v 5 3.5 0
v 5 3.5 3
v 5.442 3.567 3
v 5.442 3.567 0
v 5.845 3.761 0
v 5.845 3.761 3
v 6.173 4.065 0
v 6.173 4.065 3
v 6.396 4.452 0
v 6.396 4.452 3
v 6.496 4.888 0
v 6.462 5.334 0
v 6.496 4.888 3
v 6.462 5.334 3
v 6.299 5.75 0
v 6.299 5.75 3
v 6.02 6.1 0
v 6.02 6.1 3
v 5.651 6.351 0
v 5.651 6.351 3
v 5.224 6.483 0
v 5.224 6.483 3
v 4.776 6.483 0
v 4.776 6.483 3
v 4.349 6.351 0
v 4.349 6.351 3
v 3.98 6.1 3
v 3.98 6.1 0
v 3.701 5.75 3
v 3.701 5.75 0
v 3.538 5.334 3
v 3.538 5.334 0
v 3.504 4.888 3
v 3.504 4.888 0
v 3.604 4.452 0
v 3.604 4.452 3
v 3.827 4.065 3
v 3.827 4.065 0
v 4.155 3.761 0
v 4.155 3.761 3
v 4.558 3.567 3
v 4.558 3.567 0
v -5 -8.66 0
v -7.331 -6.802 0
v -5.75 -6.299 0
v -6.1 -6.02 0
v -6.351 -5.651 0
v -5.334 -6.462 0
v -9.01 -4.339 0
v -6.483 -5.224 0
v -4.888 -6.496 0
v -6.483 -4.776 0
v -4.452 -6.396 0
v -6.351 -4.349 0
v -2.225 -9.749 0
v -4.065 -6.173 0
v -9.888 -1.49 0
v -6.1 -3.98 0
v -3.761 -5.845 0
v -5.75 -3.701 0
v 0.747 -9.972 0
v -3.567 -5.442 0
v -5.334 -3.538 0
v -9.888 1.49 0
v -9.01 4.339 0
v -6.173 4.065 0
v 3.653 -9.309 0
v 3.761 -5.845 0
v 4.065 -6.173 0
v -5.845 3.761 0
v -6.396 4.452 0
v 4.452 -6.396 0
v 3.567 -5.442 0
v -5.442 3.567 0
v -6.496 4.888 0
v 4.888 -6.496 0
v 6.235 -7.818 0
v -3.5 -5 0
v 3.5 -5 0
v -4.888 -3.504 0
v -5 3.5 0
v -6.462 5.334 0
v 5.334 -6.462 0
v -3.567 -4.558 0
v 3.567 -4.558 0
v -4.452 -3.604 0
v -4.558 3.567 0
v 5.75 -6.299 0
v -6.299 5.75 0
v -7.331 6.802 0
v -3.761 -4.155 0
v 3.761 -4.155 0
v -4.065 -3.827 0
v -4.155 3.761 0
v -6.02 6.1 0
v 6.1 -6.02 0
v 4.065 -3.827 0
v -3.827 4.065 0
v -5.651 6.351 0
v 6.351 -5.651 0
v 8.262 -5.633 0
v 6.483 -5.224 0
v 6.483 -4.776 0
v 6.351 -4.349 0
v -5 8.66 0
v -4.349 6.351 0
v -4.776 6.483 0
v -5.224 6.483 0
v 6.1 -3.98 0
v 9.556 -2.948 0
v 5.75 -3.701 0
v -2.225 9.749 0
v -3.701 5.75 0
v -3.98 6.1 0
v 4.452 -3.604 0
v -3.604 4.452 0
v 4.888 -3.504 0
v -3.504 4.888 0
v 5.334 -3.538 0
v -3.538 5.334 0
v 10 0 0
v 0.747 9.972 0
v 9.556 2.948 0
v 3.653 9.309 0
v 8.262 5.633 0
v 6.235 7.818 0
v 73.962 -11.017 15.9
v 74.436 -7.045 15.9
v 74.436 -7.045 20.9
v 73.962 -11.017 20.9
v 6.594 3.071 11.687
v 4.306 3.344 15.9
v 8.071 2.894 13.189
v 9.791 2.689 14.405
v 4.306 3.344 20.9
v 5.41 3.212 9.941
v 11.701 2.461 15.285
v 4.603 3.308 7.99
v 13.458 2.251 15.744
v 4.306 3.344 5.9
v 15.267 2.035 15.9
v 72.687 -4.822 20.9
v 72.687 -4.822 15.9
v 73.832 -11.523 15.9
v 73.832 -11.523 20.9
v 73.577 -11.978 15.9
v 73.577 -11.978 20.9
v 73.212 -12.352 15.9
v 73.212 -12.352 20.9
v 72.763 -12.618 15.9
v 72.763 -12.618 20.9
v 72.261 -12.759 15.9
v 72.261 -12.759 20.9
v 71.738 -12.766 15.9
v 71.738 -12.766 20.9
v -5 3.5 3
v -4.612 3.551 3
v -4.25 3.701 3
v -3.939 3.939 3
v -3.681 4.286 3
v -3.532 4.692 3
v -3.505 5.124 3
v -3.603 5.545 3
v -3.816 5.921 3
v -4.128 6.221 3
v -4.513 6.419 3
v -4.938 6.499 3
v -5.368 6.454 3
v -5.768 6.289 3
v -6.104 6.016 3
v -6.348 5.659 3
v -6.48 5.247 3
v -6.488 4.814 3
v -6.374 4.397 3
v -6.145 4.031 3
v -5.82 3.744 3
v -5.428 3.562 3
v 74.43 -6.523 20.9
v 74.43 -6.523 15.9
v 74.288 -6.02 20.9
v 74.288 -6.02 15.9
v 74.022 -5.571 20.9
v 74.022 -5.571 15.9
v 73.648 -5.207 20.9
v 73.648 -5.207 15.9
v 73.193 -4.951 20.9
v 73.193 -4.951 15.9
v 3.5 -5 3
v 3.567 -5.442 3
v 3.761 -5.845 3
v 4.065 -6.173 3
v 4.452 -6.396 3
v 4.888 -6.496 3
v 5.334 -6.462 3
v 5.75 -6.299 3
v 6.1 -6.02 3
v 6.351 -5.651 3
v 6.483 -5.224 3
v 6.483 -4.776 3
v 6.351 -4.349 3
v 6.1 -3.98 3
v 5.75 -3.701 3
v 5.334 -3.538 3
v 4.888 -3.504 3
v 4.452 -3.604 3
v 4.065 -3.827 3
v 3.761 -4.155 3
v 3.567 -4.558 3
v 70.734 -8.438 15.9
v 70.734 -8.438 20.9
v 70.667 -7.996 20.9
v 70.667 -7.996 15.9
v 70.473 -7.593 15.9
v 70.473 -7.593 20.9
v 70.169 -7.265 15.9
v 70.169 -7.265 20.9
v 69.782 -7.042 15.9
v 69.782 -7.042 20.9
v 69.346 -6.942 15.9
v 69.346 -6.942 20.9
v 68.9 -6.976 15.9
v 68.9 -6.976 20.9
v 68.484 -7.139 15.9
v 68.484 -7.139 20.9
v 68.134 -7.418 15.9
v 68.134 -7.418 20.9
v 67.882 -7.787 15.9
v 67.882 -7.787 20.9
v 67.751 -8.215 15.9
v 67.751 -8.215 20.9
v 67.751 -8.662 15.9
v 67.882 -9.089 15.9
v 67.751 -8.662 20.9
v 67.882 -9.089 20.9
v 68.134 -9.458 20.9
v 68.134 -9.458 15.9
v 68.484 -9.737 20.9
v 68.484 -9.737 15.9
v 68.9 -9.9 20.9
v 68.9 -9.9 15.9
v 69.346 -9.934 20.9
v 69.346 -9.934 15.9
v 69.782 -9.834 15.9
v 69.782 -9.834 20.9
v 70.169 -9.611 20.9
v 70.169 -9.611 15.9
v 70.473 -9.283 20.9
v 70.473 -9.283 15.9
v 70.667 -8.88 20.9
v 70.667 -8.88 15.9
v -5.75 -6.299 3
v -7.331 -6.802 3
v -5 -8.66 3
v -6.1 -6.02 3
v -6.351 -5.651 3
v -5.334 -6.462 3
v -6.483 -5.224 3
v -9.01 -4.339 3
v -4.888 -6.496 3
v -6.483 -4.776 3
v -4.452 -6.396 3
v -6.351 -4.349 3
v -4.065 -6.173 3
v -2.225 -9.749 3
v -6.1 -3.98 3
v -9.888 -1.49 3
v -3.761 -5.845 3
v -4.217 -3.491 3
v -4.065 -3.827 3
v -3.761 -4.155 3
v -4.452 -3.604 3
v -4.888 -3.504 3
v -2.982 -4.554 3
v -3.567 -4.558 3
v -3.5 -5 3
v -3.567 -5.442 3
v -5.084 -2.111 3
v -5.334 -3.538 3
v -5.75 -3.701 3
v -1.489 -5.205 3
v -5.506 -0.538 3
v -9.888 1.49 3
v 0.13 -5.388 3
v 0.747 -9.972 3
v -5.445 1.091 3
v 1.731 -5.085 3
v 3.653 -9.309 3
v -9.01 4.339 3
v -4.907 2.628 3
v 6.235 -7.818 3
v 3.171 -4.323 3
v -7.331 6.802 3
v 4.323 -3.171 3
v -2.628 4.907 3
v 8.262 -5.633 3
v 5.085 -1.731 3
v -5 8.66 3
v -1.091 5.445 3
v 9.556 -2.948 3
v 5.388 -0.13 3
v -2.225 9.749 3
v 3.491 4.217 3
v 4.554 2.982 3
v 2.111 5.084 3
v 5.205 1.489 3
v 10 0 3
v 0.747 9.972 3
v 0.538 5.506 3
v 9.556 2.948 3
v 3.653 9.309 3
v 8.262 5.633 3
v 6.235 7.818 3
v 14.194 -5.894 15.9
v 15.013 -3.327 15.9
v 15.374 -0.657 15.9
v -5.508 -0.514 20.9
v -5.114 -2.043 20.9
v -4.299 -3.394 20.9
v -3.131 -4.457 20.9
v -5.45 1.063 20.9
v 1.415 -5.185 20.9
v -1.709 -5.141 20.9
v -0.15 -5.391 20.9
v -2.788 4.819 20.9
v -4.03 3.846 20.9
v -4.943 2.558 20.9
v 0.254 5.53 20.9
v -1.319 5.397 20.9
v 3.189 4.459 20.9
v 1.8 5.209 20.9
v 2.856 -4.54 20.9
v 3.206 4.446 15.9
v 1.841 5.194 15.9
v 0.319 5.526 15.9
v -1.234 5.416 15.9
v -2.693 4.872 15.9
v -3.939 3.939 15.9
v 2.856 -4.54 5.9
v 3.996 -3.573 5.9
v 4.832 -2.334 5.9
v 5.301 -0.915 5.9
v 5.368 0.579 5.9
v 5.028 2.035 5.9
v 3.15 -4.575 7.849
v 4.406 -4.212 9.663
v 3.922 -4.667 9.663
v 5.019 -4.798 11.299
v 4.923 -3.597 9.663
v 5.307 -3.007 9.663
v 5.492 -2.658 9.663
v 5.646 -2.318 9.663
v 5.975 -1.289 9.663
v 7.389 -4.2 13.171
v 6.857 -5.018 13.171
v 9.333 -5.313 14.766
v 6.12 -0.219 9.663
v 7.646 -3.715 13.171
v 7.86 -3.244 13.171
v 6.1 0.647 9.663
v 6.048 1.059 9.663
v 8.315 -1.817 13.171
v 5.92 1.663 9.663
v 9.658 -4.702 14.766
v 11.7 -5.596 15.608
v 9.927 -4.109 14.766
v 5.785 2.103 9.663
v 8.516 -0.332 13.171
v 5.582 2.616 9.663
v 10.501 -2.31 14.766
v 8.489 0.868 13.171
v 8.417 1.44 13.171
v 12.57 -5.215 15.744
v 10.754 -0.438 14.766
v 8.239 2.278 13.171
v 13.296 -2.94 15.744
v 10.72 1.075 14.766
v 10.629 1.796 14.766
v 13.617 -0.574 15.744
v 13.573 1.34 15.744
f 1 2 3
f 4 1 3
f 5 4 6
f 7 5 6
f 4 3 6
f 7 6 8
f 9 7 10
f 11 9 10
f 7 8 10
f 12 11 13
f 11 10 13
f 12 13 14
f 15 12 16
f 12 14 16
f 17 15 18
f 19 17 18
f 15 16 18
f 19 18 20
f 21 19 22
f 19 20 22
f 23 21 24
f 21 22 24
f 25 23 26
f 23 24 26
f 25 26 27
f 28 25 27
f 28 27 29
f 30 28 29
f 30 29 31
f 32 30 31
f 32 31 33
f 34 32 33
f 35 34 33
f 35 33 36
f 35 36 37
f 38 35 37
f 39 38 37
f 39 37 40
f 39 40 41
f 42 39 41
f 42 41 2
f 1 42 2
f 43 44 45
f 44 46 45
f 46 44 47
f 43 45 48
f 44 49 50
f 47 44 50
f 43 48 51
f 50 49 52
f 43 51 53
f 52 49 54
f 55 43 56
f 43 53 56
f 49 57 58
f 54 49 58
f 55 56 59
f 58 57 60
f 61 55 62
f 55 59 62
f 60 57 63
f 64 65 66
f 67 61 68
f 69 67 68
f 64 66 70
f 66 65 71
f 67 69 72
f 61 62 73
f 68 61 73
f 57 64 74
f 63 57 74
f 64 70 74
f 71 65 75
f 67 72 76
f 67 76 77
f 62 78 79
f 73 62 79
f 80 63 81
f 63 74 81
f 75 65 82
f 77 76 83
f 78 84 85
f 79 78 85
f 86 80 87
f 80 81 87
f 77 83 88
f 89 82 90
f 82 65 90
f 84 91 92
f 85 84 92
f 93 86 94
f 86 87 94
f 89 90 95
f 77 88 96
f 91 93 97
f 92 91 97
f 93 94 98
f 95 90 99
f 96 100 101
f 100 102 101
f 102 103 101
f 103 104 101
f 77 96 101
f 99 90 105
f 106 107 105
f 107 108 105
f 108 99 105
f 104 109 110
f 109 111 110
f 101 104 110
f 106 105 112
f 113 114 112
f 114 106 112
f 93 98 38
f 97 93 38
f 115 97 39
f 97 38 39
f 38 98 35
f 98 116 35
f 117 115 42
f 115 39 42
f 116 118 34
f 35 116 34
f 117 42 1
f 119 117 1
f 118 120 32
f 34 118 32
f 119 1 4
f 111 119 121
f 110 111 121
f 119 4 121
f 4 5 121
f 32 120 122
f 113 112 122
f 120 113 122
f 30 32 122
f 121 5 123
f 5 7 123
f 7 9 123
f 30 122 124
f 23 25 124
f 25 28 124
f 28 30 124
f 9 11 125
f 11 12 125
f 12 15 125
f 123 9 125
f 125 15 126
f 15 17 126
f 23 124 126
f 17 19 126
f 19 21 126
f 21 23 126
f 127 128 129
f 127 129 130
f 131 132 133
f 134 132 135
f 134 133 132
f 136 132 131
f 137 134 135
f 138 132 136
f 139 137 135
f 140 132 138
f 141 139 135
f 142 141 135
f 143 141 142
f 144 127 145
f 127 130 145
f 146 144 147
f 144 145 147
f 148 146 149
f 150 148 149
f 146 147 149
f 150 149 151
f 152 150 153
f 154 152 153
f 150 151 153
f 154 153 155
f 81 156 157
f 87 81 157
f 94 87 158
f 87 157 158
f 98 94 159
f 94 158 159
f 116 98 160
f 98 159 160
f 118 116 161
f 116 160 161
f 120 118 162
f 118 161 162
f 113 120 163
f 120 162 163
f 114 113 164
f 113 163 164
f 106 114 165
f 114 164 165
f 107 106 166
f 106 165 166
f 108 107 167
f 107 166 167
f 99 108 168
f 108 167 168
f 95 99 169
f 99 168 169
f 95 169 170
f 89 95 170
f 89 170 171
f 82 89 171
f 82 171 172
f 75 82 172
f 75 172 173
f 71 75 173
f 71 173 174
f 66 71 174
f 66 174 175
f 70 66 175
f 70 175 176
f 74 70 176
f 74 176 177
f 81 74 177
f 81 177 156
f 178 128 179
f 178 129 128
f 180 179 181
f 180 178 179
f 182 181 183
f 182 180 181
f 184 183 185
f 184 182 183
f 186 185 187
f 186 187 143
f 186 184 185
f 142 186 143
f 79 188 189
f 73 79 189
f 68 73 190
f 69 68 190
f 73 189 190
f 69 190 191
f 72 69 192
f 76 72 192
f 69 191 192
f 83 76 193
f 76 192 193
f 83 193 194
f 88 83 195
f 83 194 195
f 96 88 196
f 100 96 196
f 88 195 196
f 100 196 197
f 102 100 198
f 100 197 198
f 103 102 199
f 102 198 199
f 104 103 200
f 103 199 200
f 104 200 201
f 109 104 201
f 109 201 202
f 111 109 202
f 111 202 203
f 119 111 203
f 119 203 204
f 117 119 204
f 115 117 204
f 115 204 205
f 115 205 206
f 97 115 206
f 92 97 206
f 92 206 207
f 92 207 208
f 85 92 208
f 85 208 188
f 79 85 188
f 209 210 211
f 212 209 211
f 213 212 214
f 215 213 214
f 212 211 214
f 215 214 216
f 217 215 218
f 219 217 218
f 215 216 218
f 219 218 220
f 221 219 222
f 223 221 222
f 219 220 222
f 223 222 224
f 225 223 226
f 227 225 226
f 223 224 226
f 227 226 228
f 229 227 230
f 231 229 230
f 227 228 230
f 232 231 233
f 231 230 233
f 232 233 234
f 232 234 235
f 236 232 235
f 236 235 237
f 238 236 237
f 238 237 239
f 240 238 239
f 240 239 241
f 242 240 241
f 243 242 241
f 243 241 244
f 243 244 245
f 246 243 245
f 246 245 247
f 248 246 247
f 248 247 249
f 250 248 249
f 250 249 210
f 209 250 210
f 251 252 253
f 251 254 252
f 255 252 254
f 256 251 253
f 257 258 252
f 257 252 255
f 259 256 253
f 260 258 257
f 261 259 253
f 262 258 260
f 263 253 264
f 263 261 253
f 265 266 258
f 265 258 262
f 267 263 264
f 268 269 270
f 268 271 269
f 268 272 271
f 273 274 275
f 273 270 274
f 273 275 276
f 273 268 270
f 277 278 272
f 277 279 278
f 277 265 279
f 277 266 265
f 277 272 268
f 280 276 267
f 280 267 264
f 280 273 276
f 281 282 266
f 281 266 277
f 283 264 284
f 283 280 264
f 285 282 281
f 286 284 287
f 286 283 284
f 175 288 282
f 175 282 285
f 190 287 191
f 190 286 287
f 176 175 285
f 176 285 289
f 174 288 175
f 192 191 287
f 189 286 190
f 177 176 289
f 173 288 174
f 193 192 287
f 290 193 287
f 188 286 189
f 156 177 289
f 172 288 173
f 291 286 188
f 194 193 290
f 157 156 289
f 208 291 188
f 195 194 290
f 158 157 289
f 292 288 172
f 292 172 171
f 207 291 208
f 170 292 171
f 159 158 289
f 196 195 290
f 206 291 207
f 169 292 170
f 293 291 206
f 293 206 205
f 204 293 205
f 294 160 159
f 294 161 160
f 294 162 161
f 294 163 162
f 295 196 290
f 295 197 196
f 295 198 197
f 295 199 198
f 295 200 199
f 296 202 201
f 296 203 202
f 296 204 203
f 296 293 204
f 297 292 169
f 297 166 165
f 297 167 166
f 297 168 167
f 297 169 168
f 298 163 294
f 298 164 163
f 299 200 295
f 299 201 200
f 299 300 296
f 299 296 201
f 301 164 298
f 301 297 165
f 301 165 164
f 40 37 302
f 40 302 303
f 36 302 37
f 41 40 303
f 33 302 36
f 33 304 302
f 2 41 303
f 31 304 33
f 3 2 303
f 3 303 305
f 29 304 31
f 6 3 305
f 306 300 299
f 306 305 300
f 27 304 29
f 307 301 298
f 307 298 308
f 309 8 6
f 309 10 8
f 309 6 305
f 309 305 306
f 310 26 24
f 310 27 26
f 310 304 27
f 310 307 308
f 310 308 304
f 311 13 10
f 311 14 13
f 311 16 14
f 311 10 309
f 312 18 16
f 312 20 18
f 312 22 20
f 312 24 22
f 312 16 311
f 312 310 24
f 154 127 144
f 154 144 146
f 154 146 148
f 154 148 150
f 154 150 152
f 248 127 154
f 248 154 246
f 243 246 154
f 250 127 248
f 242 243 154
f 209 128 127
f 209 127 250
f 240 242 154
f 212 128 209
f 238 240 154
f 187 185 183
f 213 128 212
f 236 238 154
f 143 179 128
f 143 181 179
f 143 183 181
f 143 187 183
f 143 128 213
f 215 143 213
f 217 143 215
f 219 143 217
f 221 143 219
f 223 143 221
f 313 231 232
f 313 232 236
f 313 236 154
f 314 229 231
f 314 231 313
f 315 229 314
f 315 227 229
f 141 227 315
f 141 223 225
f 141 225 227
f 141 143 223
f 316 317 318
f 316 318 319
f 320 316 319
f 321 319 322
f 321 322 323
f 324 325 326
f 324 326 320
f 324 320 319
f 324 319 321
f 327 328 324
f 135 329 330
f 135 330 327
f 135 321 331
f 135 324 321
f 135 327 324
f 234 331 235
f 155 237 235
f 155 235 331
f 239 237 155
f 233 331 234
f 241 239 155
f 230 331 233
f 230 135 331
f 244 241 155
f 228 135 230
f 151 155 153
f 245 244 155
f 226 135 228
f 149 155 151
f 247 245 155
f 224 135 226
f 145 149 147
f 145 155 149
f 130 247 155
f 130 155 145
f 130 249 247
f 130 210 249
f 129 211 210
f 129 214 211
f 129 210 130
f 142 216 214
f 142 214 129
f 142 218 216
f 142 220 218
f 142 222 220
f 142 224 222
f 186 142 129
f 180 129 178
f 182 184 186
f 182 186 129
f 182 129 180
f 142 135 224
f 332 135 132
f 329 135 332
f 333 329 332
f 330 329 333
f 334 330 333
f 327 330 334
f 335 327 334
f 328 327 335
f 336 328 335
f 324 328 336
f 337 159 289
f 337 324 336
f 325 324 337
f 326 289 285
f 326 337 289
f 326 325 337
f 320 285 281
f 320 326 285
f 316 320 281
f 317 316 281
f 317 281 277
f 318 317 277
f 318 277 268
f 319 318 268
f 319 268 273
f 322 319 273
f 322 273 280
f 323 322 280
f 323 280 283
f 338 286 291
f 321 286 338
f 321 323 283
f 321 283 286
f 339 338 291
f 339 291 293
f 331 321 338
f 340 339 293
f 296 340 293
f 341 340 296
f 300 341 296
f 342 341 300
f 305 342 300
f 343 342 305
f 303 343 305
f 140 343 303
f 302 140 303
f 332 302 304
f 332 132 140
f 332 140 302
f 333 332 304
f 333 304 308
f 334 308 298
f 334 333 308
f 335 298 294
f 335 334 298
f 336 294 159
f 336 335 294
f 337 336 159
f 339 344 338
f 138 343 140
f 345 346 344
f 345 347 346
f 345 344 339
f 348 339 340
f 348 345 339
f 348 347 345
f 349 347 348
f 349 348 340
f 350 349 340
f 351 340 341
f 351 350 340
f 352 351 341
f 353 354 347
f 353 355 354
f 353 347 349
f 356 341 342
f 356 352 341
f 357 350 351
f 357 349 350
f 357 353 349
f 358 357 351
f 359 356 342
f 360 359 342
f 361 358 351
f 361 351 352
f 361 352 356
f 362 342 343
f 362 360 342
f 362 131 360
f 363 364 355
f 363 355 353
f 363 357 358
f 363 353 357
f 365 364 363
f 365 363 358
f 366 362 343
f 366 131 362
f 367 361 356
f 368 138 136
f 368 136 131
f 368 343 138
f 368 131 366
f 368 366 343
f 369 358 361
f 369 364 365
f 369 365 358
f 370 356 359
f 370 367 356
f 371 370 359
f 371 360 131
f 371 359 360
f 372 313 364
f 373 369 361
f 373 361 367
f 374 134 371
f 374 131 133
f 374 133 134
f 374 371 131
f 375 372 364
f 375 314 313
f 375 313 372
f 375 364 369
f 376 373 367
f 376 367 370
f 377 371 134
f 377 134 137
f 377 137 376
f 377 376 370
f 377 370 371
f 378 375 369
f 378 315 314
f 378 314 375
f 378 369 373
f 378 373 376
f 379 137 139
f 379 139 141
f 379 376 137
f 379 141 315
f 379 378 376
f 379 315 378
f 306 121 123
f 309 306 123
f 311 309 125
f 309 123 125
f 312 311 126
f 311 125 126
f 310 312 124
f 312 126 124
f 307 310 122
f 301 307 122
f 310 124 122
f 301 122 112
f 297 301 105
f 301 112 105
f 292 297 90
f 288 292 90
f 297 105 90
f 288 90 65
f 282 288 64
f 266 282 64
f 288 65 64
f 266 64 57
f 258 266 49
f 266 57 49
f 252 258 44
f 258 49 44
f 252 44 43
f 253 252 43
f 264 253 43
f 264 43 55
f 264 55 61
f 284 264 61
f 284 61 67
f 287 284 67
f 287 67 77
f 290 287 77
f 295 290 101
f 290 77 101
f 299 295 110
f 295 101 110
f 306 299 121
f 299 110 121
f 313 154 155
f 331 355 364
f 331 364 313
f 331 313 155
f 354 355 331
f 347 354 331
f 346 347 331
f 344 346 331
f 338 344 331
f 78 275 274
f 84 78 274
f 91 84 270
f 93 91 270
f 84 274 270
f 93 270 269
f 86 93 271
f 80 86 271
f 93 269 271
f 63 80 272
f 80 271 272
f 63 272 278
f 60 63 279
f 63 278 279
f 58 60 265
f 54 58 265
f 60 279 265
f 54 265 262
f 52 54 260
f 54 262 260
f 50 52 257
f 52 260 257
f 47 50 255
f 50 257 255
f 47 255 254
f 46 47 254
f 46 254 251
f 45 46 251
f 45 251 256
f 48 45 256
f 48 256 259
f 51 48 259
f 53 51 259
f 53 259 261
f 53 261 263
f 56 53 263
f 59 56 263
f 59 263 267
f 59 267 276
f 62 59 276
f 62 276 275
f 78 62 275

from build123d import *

# Parameters (mm, degrees)
SKETCH_1_R          = 10
EXTRUDE_1_DEPTH     = 3
SKETCH_2_R          = 1.5
CUT_EXTRUDE_1_DEPTH = 15.45683229480096
EXTRUDE_START       = 12.9
SKETCH_3_R          = 5.465897693502911
SKETCH_3_R_2        = 1.5000000000000002
EXTRUDE_2_DEPTH     = 12.9
EXTRUDE_START_2     = -15.9
SKETCH_4_R          = 1.5000000000000002
EXTRUDE_4_DEPTH     = 15.9
EXTRUDE_5_DEPTH     = 5
SKETCH_6_R          = 1.4999999999999973
CUT_EXTRUDE_2_DEPTH = 79.62526207388743
EXTRUDE_START_3     = 5
EXTRUDE_8_DEPTH     = 5
FILLET_1_R          = 10
FILLET_2_R          = 2


with BuildPart() as part:
    # 草图1 → 凸台-拉伸1 (new body)
    with BuildSketch(Plane.XY):
        Circle(SKETCH_1_R)
    extrude(amount=EXTRUDE_1_DEPTH)

    # 草图2 → 切除-拉伸1 (cut, through all)
    with BuildSketch(Plane.XY.offset(3)):
        with BuildLine():
            ThreePointArc((-3.5, 4.999999999999998), (-6.060660171779828, 6.060660171779813), (-4.999999999999981, 3.4999999999999982))
            Line((-5, 3.499999999999999), (-5, 4.999999999999999))
            Line((-5, 4.999999999999998), (-3.5, 4.999999999999998))
        make_face()
        with BuildLine():
            Line((-5, 4.999999999999999), (-5, 3.499999999999999))
            ThreePointArc((-4.999999999999981, 3.4999999999999982), (-3.939339828220172, 3.9393398282201835), (-3.5, 4.999999999999998))
            Line((-3.5, 4.999999999999998), (-5, 4.999999999999998))
        make_face()
        with BuildLine():
            ThreePointArc((3.499999999999999, 5.000000000000001), (3.9393398282201844, 3.939339828220173), (5.000000000000019, 3.5))
            Line((5, 3.500000000000001), (5, 5.000000000000001))
            Line((5, 5.000000000000001), (3.499999999999999, 5.000000000000001))
        make_face()
        with BuildLine():
            Line((5, 5.000000000000001), (5, 3.500000000000001))
            ThreePointArc((5.000000000000019, 3.5), (6.060660171779828, 3.9393398282201852), (6.500000000000001, 5.000000000000001))
            ThreePointArc((6.500000000000001, 5.000000000000001), (5, 6.500000000000002), (3.499999999999999, 5.000000000000001))
            Line((3.499999999999999, 5.000000000000001), (5, 5.000000000000001))
        make_face()
        with BuildLine():
            ThreePointArc((-4.9999999999999805, -3.500000000000001), (-6.060660171779829, -6.060660171779815), (-3.5, -5.000000000000001))
            Line((-3.5, -5.000000000000001), (-5, -5.000000000000001))
            Line((-5, -5.000000000000001), (-5, -3.500000000000001))
        make_face()
        with BuildLine():
            Line((-5, -5.000000000000001), (-3.5, -5.000000000000001))
            ThreePointArc((-3.5, -5.000000000000001), (-3.939339828220172, -3.939339828220186), (-4.9999999999999805, -3.500000000000001))
            Line((-5, -3.500000000000001), (-5, -5.000000000000001))
        make_face()
        with BuildLine():
            ThreePointArc((5.0000000000000195, -3.4999999999999982), (3.9393398282201852, -3.9393398282201706), (3.499999999999999, -4.999999999999999))
            Line((3.499999999999999, -4.999999999999999), (5, -4.999999999999999))
            Line((5, -4.999999999999999), (5, -3.4999999999999982))
        make_face()
        with BuildLine():
            Line((5, -4.999999999999999), (3.499999999999999, -4.999999999999999))
            ThreePointArc((3.499999999999999, -4.999999999999999), (5, -6.5), (6.500000000000001, -4.999999999999999))
            ThreePointArc((6.500000000000001, -4.999999999999999), (6.060660171779829, -3.9393398282201844), (5.0000000000000195, -3.4999999999999982))
            Line((5, -3.4999999999999982), (5, -4.999999999999999))
        make_face()
        Circle(SKETCH_2_R)
    extrude(amount=-CUT_EXTRUDE_1_DEPTH, mode=Mode.SUBTRACT)

    # 草图3 → 凸台-拉伸2 (add)
    with BuildSketch(Plane.XY.offset(3).offset(EXTRUDE_START)):
        with Locations(Location((-0.07436650387235982, 0.07436650387235982, 0), (0, 0, 135))):
            Circle(SKETCH_3_R)
        Circle(SKETCH_3_R_2, mode=Mode.SUBTRACT)
    extrude(amount=-EXTRUDE_2_DEPTH)

    # 草图4 → 凸台-拉伸4 (add)
    with BuildSketch(Plane(origin=(0, 0, 0), x_dir=(-1, 0, 0), z_dir=(0, 0, -1)).offset(EXTRUDE_START_2)):
        Circle(SKETCH_4_R)
    extrude(amount=EXTRUDE_4_DEPTH)

    # 草图5 → 凸台-拉伸5 (add)
    with BuildSketch(Plane.XY.offset(15.9)):
        Polygon((74.67295984530996, -5.059165048643418), (73.72436785298946, -13.002726795876548), (-0.7465235273211024, -4.1096768678718245), (0.2020684649993922, 3.83388487936125), align=None)
    extrude(amount=EXTRUDE_5_DEPTH)

    # 草图6 → 切除-拉伸2 (cut, through all)
    with BuildSketch(Plane.XY.offset(20.900000000000002)):
        with Locations((69.23393775712903, -8.438075927059709)):
            Circle(SKETCH_6_R)
    extrude(amount=-CUT_EXTRUDE_2_DEPTH, mode=Mode.SUBTRACT)

    # 草图7 → 凸台-拉伸8 (add)
    with BuildSketch(Plane.XY.offset(15.9).offset(EXTRUDE_START_3)):
        with BuildLine():
            Line((0.2020684649993922, 3.83388487936125), (4.305897204794468, 3.3438201949921416))
            ThreePointArc((4.305897204794468, 3.3438201949921416), (-5.4500676526118506, 1.0632420042673105), (2.8556757439201084, -4.53983873885273))
            Line((2.8556757439201084, -4.53983873885273), (-0.7465235273211024, -4.1096768678718245))
            Line((-0.7465235273211024, -4.1096768678718245), (0.2020684649993922, 3.83388487936125))
        make_face()
    extrude(amount=-EXTRUDE_8_DEPTH)

    # 圆角1
    fillet_1_edges = [part.edges().sort_by_distance(p)[0] for p in [
        (5.301334644867113, -0.914508996522684, 15.9),
    ]]
    fillet(fillet_1_edges, radius=FILLET_1_R)

    # 圆角2
    fillet_2_edges = [part.edges().sort_by_distance(p)[0] for p in [
        (73.72436785298946, -13.002726795876548, 18.4),
        (74.67295984530996, -5.059165048643418, 18.4),
    ]]
    fillet(fillet_2_edges, radius=FILLET_2_R)


solid = part.part
